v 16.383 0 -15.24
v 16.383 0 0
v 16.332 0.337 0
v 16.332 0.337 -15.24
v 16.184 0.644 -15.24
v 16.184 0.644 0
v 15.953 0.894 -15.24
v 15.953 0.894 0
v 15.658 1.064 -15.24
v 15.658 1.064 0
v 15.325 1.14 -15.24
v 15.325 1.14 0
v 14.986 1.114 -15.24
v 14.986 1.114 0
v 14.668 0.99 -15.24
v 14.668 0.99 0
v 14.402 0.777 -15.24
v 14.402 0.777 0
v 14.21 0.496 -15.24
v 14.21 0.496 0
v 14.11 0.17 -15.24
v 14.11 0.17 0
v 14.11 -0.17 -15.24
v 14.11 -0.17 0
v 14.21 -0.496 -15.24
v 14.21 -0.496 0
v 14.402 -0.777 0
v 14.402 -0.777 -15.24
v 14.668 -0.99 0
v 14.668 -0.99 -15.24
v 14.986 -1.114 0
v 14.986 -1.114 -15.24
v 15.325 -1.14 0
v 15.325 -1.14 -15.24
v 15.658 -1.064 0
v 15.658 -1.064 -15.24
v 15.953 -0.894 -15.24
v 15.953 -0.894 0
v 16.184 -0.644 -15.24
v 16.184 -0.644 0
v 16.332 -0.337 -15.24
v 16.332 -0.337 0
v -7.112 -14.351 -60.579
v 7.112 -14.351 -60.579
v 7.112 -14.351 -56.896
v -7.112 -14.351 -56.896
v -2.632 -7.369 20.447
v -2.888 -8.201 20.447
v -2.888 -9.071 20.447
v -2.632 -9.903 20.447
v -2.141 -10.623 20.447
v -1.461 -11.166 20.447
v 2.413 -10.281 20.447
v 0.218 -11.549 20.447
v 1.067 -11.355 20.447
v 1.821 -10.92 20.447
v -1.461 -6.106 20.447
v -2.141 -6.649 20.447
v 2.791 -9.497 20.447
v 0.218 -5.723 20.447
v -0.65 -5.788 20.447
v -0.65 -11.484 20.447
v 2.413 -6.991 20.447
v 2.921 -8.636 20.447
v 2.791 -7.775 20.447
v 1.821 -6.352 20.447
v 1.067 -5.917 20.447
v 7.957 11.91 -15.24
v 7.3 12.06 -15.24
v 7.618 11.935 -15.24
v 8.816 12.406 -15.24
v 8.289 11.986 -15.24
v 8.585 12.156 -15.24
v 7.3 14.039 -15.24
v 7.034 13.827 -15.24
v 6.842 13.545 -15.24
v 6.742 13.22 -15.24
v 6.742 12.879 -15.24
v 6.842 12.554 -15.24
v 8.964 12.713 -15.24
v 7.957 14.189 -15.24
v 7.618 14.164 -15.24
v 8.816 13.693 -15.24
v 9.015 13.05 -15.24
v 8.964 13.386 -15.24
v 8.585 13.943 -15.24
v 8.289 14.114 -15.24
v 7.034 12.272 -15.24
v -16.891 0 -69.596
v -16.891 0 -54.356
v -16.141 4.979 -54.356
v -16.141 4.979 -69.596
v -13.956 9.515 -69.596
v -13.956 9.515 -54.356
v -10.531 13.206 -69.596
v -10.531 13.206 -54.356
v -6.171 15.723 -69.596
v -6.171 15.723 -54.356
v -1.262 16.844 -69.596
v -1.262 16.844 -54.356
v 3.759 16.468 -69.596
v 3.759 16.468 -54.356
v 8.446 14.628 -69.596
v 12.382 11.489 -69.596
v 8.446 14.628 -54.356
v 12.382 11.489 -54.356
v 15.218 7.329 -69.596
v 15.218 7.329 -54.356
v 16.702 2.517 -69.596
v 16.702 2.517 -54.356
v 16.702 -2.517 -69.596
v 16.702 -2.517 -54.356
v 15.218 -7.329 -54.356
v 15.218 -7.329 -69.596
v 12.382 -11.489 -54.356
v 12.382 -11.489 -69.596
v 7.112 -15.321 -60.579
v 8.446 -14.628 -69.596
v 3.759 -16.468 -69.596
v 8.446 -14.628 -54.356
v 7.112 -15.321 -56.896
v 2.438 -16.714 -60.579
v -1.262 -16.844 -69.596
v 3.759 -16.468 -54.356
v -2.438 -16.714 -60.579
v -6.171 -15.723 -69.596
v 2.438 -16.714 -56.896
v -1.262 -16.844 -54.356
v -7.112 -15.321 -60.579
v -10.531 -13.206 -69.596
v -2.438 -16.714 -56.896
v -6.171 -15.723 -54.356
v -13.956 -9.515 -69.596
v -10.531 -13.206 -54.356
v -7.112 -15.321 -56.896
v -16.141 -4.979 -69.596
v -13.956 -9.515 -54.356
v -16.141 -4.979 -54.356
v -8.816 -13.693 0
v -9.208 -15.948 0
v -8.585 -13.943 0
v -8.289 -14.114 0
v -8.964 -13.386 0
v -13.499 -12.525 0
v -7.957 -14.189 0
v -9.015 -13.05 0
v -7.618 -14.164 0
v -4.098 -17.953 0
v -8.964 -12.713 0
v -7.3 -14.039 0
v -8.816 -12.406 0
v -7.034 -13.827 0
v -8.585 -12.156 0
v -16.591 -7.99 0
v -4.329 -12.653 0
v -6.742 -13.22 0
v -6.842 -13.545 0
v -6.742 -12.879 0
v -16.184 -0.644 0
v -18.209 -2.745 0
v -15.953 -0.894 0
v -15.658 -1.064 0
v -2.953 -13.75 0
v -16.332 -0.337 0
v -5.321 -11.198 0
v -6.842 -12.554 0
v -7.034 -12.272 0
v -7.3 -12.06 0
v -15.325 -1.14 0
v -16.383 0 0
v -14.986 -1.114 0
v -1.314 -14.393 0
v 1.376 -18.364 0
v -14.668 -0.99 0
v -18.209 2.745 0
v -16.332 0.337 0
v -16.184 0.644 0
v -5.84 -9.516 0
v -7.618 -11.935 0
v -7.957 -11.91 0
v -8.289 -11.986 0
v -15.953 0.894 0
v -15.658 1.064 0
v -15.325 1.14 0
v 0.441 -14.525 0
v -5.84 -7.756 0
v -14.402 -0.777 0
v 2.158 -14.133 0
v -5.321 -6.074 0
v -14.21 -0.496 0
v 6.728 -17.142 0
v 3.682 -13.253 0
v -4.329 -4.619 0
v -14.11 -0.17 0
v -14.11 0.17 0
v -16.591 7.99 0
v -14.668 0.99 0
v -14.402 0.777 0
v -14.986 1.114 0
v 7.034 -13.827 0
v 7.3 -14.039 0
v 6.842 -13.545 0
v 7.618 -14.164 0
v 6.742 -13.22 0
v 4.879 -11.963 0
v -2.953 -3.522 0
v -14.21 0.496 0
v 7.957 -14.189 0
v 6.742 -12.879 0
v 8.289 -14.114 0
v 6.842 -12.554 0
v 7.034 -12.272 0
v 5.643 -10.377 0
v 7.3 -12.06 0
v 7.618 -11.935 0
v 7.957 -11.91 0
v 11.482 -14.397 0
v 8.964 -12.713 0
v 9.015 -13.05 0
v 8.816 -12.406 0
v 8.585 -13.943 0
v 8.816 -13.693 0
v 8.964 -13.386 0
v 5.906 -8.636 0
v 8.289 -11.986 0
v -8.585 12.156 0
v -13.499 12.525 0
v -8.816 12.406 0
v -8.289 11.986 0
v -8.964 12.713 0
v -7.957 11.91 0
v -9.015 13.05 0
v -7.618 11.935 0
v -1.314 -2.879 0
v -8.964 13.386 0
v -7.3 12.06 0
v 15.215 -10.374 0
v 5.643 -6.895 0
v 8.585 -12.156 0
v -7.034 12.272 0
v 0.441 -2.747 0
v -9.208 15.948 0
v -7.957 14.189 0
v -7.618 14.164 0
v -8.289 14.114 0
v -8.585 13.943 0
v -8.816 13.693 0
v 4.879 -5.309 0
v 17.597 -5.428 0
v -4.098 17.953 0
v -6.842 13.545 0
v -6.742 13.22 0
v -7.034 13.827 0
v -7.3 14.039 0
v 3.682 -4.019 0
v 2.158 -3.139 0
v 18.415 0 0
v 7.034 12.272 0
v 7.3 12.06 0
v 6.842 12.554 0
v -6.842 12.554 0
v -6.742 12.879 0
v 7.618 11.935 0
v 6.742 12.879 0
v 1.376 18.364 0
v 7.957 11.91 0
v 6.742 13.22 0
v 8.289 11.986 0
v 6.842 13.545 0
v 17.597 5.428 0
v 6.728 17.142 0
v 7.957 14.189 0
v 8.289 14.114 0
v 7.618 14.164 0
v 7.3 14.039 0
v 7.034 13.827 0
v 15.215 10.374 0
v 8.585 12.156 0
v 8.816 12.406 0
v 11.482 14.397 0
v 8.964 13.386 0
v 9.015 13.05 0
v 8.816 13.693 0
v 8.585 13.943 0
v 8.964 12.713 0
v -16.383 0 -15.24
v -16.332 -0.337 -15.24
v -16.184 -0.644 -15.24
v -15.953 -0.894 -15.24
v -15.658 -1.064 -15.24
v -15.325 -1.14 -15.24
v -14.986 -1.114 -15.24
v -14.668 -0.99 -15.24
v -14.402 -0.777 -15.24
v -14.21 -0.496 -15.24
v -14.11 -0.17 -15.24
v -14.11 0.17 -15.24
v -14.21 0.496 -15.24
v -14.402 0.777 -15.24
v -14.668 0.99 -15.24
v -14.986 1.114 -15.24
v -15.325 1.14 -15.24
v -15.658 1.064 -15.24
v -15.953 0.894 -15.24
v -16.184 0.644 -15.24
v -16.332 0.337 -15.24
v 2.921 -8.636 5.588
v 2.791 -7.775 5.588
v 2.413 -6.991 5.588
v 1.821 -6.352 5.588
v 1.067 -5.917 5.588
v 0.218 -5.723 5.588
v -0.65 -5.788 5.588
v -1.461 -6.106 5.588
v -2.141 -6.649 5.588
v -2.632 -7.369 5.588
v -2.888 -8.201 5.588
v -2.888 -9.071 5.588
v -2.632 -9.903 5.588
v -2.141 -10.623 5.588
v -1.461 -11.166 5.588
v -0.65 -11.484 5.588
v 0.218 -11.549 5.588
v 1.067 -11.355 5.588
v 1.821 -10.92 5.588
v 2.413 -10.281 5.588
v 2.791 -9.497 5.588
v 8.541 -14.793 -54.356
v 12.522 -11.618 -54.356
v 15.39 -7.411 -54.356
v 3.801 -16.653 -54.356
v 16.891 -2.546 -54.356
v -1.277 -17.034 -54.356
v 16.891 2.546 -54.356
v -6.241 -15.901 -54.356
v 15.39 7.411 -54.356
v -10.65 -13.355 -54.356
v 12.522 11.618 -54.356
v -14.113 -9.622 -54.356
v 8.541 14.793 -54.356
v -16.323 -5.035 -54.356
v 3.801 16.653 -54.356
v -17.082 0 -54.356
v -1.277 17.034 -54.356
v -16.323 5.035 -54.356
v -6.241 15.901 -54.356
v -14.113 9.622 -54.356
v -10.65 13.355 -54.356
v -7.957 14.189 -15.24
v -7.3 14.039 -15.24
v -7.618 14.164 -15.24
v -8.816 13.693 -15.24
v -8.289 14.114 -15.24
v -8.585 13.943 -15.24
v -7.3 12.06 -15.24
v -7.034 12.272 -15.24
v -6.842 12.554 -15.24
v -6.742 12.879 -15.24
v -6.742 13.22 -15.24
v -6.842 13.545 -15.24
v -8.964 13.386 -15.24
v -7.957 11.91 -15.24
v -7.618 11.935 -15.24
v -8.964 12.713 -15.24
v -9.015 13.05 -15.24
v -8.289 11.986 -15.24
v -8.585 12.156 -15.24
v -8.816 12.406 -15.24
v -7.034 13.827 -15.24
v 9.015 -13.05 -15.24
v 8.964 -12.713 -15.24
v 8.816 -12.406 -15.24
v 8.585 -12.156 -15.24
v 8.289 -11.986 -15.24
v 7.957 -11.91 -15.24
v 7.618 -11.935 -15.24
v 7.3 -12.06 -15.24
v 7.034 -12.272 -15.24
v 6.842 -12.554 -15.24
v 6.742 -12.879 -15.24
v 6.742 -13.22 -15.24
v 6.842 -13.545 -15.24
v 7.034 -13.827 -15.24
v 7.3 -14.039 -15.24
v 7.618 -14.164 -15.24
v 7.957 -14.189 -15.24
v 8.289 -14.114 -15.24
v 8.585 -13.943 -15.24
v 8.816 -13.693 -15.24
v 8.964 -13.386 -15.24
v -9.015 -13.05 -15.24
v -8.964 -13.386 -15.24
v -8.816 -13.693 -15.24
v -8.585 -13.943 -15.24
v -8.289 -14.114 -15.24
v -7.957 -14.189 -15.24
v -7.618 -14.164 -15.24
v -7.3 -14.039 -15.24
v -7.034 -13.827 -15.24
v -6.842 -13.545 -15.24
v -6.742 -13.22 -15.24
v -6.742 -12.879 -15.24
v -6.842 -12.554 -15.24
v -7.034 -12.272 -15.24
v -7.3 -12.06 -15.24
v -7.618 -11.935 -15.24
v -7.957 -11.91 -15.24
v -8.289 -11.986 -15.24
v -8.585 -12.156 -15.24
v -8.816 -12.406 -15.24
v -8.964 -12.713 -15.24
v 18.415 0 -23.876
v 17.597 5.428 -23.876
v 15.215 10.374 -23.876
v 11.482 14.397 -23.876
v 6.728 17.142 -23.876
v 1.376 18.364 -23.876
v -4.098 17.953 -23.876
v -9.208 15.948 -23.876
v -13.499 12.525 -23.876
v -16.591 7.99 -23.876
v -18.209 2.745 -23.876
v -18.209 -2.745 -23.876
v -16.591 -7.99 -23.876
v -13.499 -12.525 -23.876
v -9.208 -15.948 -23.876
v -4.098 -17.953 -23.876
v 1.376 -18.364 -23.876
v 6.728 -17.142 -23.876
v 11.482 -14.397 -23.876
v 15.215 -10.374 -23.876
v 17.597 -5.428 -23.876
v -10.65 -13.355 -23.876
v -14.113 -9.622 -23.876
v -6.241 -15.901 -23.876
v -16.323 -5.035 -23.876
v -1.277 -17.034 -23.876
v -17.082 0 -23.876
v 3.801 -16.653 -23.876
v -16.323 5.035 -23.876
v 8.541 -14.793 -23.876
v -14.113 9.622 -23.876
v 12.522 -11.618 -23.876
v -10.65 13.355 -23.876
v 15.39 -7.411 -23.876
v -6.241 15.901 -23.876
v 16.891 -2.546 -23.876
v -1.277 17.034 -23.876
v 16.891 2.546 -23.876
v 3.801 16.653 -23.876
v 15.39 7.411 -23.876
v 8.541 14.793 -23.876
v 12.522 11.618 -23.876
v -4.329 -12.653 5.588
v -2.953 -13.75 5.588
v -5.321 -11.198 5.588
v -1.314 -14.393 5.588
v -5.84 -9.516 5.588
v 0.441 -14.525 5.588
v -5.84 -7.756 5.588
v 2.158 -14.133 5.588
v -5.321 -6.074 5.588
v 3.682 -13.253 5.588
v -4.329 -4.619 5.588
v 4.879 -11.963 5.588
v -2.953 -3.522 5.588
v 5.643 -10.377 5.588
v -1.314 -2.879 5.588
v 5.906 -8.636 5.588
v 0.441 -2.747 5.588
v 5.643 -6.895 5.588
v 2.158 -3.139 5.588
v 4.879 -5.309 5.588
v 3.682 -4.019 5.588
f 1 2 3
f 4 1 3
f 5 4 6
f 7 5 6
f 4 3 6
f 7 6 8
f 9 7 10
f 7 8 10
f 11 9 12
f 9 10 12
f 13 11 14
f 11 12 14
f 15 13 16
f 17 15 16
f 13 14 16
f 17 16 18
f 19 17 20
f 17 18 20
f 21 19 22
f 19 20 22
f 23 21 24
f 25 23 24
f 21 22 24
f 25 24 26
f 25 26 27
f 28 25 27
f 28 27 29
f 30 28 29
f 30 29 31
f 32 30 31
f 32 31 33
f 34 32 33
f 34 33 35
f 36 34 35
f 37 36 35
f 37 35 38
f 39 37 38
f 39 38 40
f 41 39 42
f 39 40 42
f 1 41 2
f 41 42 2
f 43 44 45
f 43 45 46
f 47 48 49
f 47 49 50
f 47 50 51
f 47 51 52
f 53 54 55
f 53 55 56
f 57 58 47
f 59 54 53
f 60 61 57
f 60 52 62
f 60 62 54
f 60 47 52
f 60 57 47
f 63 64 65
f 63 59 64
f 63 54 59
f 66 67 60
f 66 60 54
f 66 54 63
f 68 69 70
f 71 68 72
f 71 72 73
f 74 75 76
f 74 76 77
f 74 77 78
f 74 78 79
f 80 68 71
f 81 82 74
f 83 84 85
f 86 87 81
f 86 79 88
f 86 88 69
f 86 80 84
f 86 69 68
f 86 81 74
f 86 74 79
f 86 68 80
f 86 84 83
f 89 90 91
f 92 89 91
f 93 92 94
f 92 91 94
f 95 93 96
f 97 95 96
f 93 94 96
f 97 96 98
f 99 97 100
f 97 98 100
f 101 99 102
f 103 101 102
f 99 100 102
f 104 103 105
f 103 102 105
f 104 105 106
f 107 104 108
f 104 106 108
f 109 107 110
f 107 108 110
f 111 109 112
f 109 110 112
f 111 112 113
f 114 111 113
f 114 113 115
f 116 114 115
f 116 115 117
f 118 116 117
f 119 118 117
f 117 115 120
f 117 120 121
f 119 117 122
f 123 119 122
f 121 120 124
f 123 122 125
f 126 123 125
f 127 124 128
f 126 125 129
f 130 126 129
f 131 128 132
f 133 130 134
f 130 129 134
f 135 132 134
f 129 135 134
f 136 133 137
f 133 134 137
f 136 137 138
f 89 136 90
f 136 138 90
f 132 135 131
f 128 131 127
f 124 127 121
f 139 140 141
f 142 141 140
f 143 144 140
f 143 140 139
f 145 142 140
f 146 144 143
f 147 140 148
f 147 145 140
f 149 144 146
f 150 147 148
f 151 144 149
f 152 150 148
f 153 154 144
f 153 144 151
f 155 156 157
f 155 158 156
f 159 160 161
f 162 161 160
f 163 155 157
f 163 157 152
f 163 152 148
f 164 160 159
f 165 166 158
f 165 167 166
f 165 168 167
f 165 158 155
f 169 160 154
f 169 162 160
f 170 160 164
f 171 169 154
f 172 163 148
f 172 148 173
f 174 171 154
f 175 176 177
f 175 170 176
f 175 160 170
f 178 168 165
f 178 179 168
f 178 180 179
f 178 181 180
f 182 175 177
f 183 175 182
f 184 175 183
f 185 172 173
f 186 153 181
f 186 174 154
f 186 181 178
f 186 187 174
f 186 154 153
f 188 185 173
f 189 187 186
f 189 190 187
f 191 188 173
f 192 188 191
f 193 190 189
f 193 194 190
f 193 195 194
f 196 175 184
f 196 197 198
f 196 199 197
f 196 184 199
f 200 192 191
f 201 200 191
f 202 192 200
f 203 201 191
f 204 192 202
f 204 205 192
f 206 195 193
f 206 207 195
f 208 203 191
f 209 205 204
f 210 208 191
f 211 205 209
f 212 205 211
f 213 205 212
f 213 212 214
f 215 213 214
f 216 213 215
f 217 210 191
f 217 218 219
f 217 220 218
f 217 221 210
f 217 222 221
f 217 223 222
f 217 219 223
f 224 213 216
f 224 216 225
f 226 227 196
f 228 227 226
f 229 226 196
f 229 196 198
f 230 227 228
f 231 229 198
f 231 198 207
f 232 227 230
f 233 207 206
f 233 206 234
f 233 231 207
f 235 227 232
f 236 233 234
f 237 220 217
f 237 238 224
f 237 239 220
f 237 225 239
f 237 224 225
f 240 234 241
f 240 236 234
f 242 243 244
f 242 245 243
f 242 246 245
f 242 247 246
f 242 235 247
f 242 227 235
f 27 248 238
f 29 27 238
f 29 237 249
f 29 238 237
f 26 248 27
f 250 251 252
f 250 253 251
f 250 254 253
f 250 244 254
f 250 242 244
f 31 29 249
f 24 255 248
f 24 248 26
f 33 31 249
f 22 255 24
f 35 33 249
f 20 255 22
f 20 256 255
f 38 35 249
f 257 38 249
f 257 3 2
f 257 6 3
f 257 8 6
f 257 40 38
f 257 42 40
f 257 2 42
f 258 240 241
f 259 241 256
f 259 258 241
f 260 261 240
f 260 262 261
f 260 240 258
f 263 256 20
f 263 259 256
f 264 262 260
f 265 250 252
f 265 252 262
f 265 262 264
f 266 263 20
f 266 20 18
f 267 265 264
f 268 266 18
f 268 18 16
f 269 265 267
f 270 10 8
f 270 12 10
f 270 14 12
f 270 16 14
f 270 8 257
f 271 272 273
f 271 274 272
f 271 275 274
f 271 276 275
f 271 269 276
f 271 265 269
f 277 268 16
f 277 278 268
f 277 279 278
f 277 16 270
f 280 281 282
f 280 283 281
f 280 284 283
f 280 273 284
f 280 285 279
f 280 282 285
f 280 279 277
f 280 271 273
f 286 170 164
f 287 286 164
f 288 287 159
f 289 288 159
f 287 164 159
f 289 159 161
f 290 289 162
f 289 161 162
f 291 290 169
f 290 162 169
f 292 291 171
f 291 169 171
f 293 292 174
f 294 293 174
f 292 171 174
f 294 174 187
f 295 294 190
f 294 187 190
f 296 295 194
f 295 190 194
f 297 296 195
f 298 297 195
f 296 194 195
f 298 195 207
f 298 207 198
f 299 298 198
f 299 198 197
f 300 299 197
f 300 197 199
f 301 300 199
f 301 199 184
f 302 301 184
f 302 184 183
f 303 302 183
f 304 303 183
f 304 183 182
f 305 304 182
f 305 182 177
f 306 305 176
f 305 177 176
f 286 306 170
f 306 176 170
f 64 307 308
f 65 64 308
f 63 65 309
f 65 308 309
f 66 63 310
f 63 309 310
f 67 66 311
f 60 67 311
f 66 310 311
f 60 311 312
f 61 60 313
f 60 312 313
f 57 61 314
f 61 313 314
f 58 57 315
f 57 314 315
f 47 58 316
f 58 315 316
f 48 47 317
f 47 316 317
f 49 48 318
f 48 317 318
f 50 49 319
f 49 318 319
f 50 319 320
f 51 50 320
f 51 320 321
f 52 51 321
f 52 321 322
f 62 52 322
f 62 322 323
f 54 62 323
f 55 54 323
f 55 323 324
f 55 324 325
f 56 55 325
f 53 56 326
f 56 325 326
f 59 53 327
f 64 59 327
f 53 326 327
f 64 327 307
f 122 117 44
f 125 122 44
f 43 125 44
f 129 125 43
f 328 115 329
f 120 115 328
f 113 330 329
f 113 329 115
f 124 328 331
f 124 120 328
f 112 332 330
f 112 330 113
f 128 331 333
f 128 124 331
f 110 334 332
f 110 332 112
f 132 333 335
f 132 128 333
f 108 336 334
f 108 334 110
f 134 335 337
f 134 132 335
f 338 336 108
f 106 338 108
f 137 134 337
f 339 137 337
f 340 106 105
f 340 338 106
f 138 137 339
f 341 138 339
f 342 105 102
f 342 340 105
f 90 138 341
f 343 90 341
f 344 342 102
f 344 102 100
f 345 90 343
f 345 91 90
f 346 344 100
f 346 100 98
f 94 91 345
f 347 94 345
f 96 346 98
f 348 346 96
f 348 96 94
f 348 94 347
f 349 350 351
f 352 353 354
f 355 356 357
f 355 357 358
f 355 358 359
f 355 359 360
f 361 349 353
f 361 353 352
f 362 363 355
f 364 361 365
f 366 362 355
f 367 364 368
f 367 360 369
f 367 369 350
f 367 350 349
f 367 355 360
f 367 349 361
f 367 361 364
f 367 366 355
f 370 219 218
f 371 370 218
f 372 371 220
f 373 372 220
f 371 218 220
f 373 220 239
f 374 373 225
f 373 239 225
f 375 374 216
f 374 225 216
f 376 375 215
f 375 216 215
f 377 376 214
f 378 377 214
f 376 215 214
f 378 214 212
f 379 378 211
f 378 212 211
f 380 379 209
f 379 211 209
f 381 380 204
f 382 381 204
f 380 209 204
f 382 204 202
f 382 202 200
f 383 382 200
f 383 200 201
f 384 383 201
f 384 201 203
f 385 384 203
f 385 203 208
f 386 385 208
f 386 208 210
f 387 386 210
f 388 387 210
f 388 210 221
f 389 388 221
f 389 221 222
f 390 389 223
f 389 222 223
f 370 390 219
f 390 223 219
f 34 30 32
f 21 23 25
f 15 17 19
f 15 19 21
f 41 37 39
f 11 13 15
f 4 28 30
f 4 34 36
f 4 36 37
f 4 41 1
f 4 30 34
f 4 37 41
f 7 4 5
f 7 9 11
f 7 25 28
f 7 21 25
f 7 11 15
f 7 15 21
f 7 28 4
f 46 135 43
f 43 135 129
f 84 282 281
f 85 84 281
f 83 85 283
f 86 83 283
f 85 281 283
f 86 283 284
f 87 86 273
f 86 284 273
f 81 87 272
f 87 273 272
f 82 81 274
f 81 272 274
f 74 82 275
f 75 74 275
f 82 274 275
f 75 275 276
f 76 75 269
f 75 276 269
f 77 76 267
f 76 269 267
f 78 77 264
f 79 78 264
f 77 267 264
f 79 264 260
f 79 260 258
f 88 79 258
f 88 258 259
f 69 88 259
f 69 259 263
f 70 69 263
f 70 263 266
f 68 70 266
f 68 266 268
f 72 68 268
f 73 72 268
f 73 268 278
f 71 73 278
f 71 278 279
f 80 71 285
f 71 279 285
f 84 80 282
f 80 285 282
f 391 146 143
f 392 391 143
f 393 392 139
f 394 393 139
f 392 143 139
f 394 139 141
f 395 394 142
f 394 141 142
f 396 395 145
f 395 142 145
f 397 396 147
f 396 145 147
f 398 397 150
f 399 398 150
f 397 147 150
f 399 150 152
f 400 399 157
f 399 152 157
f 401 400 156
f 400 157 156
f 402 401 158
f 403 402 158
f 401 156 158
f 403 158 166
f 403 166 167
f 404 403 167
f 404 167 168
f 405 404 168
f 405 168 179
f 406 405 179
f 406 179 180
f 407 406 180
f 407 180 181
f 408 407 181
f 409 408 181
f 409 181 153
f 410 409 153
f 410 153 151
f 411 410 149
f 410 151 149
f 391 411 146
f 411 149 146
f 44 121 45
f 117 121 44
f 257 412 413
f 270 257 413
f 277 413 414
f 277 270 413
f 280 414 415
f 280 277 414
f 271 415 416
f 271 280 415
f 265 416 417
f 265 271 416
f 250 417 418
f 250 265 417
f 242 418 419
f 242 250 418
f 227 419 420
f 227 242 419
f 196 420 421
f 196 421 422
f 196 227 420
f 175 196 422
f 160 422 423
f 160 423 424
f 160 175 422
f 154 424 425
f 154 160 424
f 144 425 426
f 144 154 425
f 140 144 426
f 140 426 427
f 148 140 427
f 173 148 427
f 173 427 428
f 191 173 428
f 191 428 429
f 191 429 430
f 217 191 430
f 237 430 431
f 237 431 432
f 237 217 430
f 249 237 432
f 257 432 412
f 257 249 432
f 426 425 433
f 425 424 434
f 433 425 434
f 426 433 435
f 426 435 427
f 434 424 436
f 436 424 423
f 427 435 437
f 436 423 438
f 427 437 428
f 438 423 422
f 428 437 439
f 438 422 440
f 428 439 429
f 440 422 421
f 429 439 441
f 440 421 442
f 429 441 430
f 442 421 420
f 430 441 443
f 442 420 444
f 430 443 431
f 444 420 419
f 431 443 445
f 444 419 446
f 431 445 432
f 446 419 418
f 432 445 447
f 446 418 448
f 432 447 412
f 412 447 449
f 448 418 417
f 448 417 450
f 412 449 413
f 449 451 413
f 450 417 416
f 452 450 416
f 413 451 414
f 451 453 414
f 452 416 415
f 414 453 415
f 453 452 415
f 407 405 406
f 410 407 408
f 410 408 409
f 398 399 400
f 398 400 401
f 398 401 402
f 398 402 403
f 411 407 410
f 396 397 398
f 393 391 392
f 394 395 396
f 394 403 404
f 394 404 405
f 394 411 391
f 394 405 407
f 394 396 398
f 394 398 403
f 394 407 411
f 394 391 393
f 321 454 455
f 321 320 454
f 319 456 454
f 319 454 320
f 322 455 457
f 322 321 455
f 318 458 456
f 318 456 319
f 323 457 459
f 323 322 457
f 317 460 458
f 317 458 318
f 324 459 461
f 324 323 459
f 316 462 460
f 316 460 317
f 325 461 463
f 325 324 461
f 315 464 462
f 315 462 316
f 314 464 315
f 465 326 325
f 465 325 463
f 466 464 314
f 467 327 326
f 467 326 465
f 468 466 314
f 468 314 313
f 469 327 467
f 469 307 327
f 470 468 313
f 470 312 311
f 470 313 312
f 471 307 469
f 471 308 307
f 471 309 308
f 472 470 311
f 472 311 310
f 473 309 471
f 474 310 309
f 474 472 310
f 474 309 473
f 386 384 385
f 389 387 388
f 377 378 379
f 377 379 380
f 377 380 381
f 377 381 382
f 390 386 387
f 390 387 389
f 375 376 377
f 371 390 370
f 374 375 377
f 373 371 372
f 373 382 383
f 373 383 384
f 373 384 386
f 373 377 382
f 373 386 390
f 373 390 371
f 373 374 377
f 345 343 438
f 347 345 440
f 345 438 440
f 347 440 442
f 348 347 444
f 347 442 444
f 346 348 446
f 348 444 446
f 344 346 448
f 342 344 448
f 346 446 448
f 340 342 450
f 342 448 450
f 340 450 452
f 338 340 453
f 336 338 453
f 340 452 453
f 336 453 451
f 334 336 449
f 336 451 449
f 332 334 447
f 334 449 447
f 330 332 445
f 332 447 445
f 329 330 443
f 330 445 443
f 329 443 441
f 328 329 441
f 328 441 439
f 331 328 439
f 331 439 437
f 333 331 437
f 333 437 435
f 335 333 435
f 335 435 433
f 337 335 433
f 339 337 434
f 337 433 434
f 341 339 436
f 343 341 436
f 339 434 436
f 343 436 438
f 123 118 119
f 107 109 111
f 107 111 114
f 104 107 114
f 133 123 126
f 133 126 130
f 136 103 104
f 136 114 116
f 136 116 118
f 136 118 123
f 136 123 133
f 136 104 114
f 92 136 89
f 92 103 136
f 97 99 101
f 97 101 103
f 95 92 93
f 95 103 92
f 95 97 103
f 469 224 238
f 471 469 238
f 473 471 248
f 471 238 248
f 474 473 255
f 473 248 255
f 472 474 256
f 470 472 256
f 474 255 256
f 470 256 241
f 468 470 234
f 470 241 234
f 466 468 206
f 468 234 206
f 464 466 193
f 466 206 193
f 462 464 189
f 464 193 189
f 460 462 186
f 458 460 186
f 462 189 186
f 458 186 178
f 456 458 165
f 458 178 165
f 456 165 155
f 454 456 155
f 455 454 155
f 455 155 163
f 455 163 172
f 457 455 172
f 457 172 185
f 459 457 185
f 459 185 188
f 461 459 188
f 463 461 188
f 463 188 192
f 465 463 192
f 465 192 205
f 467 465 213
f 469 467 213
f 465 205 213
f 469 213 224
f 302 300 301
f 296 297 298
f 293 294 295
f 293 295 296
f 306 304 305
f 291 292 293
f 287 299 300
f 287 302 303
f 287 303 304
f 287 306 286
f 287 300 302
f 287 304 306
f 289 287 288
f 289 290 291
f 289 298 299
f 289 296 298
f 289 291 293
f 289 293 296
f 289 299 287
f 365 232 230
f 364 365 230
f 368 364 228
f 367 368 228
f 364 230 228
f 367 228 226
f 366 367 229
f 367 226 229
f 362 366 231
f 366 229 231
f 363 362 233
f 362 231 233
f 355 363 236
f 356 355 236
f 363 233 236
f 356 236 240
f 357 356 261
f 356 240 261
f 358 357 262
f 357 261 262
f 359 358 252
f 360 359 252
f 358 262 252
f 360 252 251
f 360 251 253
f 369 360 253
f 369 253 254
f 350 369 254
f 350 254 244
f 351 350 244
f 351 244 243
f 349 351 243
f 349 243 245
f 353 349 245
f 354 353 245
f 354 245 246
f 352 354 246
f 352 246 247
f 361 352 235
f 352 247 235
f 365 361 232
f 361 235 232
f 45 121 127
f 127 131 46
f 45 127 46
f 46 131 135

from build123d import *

# Parameters (mm, degrees)
SKETCH1_R           = 18.415
BOSS_EXTRUDE1_DEPTH = 23.876
SKETCH2_R           = 5.9055
BOSS_EXTRUDE2_DEPTH = 5.588
SKETCH3_R           = 2.921
BOSS_EXTRUDE3_DEPTH = 14.859
SKETCH4_R           = 17.0815
BOSS_EXTRUDE4_DEPTH = 30.48
SKETCH5_R           = 16.891
BOSS_EXTRUDE5_DEPTH = 15.24
SKETCH6_R           = 1.143
CUT_EXTRUDE1_DEPTH  = 15.24
CIRPATTERN1_COUNT   = 2
SKETCH8_W           = 14.224
SKETCH8_H           = 3.683
CUT_EXTRUDE2_DEPTH  = 2.54


with BuildPart() as part:
    # Sketch1 → Boss-Extrude1 (new body)
    with BuildSketch(Plane.XY):
        Circle(SKETCH1_R)
    extrude(amount=-BOSS_EXTRUDE1_DEPTH)

    # Sketch2 → Boss-Extrude2 (add)
    with BuildSketch(Plane.XY):
        with Locations((0, -8.636)):
            Circle(SKETCH2_R)
    extrude(amount=BOSS_EXTRUDE2_DEPTH)

    # Sketch3 → Boss-Extrude3 (add)
    with BuildSketch(Plane.XY.offset(5.588)):
        with Locations((0, -8.636)):
            Circle(SKETCH3_R)
    extrude(amount=BOSS_EXTRUDE3_DEPTH)

    # Sketch4 → Boss-Extrude4 (add)
    with BuildSketch(Plane(origin=(0, 0, -23.876), x_dir=(-1, 0, 0), z_dir=(0, 0, -1))):
        Circle(SKETCH4_R)
    extrude(amount=BOSS_EXTRUDE4_DEPTH)

    # Sketch5 → Boss-Extrude5 (add)
    with BuildSketch(Plane(origin=(0, 0, -54.356), x_dir=(-1, 0, 0), z_dir=(0, 0, -1))):
        Circle(SKETCH5_R)
    extrude(amount=BOSS_EXTRUDE5_DEPTH)

    # Sketch6 → Cut-Extrude1 (cut)
    with BuildSketch(Plane.XY):
        with Locations((7.871883333, -13.049561402)):
            Circle(SKETCH6_R)
        with Locations((15.24, 0)):
            Circle(SKETCH6_R)
        with Locations((7.871883333, 13.049561402)):
            Circle(SKETCH6_R)
    cut_extrude1 = extrude(amount=-CUT_EXTRUDE1_DEPTH, mode=Mode.SUBTRACT)

    # CirPattern1: Cut-Extrude1 ×2 about axis
    cirpattern1_axis = Axis((0, 0, 0), (0, 0, 1))
    for i in range(1, CIRPATTERN1_COUNT):
        add(cut_extrude1.rotate(cirpattern1_axis, i * 360 / CIRPATTERN1_COUNT), mode=Mode.SUBTRACT)

    # Sketch8 → Cut-Extrude2 (cut)
    with BuildSketch(Plane(origin=(0, -16.891, 0), x_dir=(-1, 0, 0), z_dir=(0, -1, 0))):
        with Locations((0, 58.7375)):
            Rectangle(SKETCH8_W, SKETCH8_H)
    extrude(amount=-CUT_EXTRUDE2_DEPTH, mode=Mode.SUBTRACT)


solid = part.part
